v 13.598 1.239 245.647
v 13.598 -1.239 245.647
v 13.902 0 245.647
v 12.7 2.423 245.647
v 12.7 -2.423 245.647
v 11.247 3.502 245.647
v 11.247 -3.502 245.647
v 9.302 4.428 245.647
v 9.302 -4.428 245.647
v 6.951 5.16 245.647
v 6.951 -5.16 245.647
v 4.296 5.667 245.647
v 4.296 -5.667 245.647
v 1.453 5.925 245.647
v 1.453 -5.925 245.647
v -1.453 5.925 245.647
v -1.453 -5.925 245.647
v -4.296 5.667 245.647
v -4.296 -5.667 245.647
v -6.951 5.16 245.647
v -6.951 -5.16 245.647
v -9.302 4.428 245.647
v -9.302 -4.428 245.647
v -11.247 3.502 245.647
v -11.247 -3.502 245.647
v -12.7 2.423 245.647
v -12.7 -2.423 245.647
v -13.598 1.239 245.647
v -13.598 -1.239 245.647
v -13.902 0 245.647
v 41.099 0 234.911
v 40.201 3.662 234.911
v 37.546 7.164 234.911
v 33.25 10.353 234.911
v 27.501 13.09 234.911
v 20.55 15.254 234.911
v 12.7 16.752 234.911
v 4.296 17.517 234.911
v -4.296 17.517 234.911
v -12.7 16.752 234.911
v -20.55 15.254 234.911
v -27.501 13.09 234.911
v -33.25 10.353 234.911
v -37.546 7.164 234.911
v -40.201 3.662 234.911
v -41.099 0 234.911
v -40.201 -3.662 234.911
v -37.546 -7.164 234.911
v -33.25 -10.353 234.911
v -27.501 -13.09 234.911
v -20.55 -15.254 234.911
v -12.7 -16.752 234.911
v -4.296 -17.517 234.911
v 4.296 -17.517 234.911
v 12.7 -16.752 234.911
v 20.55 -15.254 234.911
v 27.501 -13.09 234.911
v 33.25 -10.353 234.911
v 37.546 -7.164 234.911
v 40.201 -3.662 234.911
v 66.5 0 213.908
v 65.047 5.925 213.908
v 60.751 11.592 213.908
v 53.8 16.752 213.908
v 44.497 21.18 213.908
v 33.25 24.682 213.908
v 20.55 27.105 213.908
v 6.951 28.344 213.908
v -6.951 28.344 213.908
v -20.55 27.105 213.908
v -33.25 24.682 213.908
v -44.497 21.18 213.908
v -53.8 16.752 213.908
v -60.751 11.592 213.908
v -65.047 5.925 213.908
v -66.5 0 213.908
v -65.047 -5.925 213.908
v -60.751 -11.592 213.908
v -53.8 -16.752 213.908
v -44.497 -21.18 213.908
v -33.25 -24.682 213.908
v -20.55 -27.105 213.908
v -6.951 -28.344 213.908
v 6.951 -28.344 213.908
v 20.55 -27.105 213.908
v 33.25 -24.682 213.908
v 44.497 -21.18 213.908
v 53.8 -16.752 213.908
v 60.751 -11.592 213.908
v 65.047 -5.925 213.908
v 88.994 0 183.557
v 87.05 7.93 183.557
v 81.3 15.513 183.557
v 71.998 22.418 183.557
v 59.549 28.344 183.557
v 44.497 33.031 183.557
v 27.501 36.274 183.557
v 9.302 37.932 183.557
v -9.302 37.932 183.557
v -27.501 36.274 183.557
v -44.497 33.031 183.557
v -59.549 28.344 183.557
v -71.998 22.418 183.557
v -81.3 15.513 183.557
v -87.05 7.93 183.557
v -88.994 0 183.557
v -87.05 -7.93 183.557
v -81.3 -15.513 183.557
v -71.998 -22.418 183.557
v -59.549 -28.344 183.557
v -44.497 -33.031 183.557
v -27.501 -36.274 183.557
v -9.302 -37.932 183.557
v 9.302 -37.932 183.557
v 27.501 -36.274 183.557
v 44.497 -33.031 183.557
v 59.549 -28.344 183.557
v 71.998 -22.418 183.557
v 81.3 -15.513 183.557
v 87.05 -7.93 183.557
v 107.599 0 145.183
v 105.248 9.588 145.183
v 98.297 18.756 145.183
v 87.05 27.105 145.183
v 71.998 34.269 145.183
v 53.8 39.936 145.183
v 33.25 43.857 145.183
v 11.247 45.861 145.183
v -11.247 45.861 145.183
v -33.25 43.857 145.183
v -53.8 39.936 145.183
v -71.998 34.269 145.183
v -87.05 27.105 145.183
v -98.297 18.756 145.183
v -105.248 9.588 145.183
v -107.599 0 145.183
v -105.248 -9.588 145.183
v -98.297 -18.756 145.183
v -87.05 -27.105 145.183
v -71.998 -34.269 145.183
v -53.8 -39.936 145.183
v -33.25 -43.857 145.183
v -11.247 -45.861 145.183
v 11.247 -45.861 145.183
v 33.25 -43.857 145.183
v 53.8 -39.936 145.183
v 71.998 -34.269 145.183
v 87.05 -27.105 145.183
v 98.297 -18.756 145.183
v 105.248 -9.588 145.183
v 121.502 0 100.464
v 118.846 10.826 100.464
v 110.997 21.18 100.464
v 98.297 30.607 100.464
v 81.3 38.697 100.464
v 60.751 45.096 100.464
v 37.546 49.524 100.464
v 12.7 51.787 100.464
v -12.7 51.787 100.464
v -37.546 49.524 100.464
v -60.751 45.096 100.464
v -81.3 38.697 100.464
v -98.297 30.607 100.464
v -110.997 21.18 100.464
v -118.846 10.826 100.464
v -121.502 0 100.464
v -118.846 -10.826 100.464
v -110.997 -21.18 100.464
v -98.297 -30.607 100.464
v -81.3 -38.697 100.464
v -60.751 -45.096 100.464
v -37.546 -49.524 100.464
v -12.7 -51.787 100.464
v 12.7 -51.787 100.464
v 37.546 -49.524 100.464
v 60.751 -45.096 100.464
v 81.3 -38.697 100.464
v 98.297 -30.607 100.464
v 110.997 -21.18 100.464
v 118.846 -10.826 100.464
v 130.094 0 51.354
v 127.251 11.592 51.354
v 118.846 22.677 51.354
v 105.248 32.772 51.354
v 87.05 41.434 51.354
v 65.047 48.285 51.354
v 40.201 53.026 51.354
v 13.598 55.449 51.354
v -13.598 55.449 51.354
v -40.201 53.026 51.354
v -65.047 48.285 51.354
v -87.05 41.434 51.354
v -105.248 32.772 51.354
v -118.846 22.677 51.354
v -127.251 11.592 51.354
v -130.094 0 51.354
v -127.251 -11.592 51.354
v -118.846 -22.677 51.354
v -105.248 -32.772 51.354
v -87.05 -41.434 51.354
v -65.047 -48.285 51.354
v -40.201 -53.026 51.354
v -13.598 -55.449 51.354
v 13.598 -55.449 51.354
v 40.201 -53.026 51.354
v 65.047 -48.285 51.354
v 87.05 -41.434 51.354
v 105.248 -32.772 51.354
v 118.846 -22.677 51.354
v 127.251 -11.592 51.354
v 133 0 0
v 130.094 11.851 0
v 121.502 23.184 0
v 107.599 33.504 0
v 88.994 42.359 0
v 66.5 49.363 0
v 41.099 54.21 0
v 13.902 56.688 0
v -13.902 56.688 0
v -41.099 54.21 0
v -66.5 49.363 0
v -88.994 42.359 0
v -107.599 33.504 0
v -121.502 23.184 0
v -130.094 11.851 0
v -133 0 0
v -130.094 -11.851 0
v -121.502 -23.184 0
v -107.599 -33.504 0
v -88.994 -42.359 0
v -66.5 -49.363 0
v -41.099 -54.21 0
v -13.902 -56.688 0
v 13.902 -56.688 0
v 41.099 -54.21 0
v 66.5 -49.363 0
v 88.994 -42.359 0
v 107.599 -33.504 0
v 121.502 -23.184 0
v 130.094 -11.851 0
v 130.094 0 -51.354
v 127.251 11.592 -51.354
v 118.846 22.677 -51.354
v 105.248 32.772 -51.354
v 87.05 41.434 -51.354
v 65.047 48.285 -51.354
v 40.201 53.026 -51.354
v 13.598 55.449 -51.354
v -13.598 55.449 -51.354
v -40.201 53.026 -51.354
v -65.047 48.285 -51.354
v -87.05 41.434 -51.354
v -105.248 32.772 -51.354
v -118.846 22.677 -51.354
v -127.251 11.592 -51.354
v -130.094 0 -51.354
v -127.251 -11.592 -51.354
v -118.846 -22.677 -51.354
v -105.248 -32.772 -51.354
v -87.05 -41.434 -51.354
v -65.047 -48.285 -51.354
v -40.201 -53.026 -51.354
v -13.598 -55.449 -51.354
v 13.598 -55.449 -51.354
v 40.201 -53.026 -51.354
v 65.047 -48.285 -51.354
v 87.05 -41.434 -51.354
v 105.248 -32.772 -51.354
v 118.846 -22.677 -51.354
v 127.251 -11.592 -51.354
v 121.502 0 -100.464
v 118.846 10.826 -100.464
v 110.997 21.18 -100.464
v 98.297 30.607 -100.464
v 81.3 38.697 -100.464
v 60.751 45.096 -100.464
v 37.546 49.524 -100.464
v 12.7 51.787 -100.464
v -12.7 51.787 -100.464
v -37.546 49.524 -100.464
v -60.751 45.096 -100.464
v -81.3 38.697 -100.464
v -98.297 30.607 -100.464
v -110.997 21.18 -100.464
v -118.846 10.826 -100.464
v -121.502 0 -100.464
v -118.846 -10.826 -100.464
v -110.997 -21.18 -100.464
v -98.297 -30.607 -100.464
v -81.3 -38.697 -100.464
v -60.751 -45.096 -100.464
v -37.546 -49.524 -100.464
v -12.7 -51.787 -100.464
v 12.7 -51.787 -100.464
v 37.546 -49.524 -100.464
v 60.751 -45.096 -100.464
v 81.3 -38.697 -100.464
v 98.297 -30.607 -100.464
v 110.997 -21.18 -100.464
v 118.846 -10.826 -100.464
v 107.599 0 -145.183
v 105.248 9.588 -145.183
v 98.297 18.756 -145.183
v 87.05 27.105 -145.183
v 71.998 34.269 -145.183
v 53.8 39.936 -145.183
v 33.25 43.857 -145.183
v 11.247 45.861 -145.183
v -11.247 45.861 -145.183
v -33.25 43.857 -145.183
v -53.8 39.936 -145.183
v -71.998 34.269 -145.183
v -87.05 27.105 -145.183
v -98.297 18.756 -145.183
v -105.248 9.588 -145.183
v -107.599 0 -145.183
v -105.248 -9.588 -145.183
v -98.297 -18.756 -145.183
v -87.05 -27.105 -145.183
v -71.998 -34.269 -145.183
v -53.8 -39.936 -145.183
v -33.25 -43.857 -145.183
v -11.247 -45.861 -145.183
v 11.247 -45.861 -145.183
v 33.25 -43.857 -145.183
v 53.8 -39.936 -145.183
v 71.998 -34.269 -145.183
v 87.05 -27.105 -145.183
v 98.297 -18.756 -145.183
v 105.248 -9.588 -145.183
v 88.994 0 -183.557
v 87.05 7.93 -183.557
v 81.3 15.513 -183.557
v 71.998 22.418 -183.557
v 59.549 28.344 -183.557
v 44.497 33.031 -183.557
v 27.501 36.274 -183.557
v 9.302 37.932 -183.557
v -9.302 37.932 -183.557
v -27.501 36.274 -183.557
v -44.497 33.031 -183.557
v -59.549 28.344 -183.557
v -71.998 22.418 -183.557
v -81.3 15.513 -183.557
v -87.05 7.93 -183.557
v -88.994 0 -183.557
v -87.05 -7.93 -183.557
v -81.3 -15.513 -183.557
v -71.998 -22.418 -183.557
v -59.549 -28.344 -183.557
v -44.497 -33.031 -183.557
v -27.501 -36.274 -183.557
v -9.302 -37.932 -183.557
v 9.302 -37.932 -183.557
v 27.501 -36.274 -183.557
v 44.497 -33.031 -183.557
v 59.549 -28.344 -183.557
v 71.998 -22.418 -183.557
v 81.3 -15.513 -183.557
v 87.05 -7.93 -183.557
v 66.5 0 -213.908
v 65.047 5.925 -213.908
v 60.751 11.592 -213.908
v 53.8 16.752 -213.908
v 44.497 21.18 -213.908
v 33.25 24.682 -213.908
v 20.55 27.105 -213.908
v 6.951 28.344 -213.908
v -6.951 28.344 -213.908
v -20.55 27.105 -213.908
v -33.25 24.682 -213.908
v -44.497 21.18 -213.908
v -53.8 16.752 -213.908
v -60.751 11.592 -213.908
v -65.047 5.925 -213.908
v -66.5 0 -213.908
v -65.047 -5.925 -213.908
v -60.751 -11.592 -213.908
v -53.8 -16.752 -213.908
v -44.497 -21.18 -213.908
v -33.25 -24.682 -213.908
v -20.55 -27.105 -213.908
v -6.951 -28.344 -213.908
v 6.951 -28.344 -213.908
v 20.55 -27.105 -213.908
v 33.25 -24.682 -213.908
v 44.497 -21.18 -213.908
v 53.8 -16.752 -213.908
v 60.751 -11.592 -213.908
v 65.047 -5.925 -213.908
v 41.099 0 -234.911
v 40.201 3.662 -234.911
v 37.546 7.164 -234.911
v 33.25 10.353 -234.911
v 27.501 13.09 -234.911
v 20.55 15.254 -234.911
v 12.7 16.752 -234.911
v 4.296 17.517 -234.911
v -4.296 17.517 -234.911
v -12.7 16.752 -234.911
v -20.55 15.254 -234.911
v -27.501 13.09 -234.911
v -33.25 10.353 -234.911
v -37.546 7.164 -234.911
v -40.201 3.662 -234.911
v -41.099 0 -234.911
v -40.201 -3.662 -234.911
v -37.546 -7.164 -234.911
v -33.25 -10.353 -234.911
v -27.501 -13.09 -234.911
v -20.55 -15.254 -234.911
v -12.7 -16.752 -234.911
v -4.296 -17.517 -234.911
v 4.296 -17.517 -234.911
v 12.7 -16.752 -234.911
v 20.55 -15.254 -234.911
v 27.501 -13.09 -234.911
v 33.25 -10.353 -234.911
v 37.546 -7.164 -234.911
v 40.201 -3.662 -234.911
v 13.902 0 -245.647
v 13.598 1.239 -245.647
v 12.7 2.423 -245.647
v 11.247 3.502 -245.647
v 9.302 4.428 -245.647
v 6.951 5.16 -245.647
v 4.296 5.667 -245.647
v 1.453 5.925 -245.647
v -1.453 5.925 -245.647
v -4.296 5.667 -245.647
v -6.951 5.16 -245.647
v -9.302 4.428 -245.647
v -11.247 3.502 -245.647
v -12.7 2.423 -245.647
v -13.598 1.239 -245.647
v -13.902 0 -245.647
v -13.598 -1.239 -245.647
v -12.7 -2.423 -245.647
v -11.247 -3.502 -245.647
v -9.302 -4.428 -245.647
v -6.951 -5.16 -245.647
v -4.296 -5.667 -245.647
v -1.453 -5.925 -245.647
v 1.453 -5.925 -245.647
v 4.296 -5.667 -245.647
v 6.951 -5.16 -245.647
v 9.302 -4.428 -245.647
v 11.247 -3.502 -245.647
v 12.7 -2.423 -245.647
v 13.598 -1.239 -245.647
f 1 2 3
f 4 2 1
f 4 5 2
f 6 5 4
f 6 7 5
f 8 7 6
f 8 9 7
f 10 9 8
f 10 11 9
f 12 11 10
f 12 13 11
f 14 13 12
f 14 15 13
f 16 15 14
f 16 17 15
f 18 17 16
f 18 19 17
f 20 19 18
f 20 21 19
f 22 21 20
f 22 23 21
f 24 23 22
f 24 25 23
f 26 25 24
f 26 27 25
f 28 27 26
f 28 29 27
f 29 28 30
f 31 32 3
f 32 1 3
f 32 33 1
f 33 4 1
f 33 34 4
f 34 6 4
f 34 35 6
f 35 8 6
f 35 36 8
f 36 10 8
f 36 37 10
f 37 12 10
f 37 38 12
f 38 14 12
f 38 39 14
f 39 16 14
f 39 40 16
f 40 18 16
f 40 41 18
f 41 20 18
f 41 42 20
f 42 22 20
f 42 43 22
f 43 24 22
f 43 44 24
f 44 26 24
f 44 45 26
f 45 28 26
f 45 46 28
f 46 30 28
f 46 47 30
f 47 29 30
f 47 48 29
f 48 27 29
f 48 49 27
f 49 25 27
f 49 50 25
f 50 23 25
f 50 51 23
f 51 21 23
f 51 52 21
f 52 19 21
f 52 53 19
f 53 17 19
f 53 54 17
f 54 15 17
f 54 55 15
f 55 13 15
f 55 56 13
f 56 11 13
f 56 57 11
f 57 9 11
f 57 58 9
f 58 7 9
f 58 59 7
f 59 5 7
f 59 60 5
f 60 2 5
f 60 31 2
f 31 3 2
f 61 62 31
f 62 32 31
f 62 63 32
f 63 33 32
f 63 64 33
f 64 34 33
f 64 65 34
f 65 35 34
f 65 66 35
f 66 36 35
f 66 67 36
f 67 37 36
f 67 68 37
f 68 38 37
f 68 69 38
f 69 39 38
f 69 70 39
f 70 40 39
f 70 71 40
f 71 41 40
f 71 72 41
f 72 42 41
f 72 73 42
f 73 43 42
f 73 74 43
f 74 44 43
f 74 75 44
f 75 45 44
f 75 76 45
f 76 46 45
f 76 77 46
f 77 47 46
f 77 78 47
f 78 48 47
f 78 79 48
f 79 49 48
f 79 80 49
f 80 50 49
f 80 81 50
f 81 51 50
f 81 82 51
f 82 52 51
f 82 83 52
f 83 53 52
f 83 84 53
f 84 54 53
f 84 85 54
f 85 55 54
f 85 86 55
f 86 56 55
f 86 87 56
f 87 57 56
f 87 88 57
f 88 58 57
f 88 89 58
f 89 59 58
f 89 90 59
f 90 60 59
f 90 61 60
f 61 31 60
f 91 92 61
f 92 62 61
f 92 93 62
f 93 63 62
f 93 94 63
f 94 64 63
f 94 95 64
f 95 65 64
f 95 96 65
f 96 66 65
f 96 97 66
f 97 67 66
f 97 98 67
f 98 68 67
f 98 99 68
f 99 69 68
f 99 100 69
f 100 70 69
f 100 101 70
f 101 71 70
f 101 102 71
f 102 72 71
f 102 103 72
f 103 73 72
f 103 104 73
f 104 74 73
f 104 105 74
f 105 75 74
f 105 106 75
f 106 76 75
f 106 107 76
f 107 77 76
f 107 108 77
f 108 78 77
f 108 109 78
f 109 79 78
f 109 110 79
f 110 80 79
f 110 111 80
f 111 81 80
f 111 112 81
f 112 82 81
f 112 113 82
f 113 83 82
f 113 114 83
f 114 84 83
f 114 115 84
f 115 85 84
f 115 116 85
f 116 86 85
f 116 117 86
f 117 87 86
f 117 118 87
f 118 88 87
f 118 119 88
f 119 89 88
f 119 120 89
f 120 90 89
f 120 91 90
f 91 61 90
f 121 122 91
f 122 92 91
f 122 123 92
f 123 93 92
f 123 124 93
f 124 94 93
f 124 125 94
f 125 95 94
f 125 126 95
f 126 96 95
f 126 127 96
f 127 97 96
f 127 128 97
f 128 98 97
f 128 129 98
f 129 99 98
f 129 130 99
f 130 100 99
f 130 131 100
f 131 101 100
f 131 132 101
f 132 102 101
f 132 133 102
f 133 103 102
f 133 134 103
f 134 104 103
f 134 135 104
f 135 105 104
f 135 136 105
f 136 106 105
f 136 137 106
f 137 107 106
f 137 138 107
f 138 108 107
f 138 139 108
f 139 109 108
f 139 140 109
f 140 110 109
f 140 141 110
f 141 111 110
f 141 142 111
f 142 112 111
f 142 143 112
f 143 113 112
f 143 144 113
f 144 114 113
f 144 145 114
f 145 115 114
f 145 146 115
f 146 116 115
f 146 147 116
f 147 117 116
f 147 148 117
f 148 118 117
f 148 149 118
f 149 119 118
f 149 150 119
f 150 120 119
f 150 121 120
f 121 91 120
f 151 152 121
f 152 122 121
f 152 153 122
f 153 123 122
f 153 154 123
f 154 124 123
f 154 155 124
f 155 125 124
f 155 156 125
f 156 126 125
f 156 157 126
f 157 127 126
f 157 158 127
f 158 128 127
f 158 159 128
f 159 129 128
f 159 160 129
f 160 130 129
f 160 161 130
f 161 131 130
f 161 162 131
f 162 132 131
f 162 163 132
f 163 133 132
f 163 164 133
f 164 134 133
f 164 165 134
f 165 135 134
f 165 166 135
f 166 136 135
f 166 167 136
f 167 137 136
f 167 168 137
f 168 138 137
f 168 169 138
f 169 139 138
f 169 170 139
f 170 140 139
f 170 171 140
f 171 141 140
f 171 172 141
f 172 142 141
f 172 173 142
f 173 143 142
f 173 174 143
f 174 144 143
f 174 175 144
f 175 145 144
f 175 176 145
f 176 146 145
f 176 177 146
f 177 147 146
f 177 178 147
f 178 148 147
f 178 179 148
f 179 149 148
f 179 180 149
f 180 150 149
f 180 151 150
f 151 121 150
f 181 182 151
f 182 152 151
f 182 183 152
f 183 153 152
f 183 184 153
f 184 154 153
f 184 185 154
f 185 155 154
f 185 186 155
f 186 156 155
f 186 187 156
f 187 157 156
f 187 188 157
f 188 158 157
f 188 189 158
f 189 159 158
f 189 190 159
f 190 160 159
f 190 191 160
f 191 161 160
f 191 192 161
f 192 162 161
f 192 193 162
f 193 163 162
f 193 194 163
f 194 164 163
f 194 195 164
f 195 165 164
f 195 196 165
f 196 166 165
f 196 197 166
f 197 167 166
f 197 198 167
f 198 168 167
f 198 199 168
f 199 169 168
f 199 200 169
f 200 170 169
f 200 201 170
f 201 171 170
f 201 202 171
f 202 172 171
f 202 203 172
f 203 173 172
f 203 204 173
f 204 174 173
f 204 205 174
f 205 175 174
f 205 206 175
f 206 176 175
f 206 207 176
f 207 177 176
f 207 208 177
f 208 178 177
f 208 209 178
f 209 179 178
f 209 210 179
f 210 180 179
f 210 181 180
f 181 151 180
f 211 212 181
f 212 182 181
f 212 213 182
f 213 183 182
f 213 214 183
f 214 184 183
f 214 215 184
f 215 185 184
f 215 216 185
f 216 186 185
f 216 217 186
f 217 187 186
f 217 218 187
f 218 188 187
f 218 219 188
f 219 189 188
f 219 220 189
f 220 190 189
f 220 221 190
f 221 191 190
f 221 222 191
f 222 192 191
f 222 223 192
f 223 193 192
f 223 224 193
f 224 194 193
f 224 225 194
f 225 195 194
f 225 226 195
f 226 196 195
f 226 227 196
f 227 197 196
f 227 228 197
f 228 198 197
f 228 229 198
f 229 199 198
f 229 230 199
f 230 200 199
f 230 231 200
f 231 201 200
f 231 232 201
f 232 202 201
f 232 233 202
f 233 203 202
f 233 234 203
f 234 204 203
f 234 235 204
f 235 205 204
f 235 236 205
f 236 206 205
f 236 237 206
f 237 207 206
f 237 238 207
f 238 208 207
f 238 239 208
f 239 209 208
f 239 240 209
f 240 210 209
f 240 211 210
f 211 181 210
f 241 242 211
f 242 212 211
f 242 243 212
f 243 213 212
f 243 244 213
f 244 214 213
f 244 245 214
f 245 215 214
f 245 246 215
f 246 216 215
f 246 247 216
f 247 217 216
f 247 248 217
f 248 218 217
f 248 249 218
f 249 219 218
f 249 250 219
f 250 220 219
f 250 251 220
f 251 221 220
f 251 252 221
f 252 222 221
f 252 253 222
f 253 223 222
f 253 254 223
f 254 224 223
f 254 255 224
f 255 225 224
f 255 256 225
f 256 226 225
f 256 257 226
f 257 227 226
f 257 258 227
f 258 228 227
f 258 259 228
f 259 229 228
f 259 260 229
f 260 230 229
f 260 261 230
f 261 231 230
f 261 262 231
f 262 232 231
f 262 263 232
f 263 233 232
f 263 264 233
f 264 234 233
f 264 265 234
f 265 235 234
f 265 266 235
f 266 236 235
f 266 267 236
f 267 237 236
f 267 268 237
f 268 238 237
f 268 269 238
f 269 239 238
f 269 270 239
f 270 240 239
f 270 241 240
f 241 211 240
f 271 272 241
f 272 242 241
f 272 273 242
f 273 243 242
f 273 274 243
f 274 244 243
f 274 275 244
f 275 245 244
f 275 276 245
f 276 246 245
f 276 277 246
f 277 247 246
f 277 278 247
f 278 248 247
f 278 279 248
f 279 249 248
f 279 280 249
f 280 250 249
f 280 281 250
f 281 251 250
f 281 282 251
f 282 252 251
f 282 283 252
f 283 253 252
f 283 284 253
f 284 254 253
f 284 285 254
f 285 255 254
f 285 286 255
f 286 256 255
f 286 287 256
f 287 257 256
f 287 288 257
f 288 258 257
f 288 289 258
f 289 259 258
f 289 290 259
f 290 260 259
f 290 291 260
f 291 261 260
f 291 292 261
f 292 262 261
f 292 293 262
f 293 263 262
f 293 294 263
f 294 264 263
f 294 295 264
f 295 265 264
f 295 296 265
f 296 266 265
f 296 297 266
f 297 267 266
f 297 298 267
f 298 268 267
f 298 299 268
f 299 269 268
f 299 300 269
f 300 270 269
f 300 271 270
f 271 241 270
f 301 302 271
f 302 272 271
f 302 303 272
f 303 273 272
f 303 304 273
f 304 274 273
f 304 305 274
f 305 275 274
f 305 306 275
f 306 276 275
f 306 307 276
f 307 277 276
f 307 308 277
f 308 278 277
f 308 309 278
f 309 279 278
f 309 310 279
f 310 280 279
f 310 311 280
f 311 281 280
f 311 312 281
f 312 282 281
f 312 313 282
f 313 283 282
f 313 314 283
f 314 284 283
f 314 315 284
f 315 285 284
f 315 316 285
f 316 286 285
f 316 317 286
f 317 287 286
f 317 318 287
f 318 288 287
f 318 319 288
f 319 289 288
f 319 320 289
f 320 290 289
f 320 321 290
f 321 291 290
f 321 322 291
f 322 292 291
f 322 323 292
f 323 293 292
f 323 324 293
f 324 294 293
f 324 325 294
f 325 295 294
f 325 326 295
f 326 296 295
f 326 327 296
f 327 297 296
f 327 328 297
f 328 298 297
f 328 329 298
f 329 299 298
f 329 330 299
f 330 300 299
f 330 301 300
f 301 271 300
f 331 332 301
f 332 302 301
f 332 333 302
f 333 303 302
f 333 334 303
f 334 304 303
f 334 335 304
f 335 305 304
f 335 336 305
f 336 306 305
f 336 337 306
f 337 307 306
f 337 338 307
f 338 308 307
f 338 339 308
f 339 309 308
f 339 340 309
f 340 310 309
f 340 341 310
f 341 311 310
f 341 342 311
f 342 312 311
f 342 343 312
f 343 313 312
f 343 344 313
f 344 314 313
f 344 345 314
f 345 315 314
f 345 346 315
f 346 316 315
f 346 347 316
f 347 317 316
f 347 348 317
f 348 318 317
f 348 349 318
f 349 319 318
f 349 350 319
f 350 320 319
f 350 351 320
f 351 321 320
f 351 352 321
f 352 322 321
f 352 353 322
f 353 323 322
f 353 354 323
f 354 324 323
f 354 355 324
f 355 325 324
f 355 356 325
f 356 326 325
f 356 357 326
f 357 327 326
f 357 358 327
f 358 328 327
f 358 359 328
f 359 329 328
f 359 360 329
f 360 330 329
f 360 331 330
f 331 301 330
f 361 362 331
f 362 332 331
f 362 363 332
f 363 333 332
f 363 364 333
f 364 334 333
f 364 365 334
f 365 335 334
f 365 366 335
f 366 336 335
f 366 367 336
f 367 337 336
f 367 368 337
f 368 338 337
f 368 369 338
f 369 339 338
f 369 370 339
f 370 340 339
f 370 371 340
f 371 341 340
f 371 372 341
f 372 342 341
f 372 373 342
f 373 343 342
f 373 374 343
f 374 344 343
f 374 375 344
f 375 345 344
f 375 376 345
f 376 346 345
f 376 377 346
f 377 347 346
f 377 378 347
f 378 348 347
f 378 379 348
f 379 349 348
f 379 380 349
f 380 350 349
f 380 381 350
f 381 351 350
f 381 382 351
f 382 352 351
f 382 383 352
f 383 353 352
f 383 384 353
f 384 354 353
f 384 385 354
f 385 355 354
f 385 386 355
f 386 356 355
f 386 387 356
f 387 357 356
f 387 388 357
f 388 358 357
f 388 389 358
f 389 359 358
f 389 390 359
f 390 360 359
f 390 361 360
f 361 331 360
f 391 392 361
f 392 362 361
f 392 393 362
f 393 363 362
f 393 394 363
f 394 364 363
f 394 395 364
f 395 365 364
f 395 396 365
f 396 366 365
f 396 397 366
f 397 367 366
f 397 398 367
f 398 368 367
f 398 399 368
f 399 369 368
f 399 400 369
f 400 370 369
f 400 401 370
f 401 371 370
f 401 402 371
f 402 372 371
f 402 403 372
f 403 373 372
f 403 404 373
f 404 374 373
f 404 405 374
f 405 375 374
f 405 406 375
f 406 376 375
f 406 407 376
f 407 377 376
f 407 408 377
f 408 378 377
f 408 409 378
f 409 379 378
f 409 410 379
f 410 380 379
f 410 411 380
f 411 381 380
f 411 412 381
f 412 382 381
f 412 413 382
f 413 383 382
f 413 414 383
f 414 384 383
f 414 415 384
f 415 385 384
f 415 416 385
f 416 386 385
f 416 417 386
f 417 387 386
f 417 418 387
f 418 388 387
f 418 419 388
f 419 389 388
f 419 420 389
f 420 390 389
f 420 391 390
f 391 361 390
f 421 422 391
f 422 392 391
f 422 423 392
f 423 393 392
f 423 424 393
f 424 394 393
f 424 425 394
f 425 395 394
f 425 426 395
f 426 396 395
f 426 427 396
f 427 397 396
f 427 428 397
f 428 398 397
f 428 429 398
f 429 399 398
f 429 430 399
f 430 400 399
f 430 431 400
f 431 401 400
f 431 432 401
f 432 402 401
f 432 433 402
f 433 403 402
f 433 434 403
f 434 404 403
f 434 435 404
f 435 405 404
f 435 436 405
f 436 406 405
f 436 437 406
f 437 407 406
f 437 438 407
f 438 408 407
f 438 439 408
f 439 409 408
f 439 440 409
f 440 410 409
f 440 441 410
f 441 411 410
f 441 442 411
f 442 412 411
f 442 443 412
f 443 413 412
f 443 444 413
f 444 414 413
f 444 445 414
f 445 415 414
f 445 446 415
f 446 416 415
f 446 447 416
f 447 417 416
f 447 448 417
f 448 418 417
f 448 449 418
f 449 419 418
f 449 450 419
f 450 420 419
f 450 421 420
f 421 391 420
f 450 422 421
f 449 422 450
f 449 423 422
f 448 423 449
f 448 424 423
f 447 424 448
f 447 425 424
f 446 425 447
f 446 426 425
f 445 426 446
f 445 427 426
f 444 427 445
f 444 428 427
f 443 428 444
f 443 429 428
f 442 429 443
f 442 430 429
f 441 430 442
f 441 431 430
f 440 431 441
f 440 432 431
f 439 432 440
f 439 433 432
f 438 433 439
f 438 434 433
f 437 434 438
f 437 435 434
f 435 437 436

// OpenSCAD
// Generated by SolidPython 1.0.1 on 2020-07-29 00:46:47


scale(v = [7, 3, 13]) {
	sphere(r = 19);
}
/***********************************************
*********      SolidPython code:      **********
************************************************
 
# import packages: SolidPython
from solid import *
from solid.utils import *
from itertools import chain, combinations, permutations


class Resize:

    def __init__(self, scad_file):
        self.scad_file = scad_file
        #self.scad_file = import_scad(scad_file)
        # cone/cylinder param:
        self.r1 = 0
        self.r2 = 0
        self.h = 0
        # rectangular prism param:
        self.w = 0
        self.l = 0
        # ellipse param:
        self.r = 0

    # import OpenScad code (file name corresponds to shape)


    # classify shape + parameters
    def assign(self, param1, param2, param3):
        if self.scad_file == 'cone.scad':
            self.r1 = param1
            self.r2 = param2
            self.h = param3
        elif self.scad_file == 'cylinder.scad':
            self.r1 = param1
            self.r2 = param2
            self.h = param3
        elif self.scad_file == 'rectangularPrism.scad':
            self.h = param1
            self.l = param2
            self.w = param3
        else:
            self.r = param1
            self.h = param2

    # resize parameters
    def iterate(self):
        x = range(3, 20, 2)
        i = 1
        if self.scad_file == 'cone.scad':
            tempList = list(permutations(x, 2))
            for temp in tempList:
                param1 = temp[0]
                param2 = temp[1]
                filepath = 'produced_scad_files/' + 'cone' + str(param1) + '_' + str(param2) + '_' + '.scad'
                scad_render_to_file(cylinder(h=param1, r1=param2, r2=0), filepath)

        elif self.scad_file == 'cylinder.scad':
            tempList = list(permutations(x, 3))
            for temp in tempList:
                param1 = temp[0]
                param2 = temp[1]
                filepath = 'produced_scad_files/' + 'cylinder' + str(param1) + '_' + str(param2) + '_' + '.scad'
                scad_render_to_file(cylinder(h=param1, r1=param2, r2=param2), filepath)

        elif self.scad_file == 'rectangularPrism.scad':
            tempList = list(permutations(x, 3))
            for temp in tempList:
                param1 = temp[0]
                param2 = temp[1]
                param3 = temp[2]
                filepath = 'produced_scad_files/' + 'rectangularPrism' + str(param1) + '_' + str(param2) + '_' + str(
                    param3) + '.scad'
                scad_render_to_file(cube(size=(param1, param2, param3)), filepath)

        elif self.scad_file == 'ellipse.scad':
            tempList = list(permutations(x, 4))
            for temp in tempList:
                param1 = temp[0]
                param2 = temp[1]
                param3 = temp[2]
                param4 = temp[3]
                filepath = 'produced_scad_files/' + 'ellipse' + str(param1) + '_' + str(param2) + '_' + str(param3) + '_' + str(param4) + '.scad'
                scad_render_to_file(scale([param1, param2, param3])(sphere(r=param4)), filepath)

    def render_to_scadfile(self):
        scad_render_to_file(scad, 'example.scad') 
 
************************************************/
